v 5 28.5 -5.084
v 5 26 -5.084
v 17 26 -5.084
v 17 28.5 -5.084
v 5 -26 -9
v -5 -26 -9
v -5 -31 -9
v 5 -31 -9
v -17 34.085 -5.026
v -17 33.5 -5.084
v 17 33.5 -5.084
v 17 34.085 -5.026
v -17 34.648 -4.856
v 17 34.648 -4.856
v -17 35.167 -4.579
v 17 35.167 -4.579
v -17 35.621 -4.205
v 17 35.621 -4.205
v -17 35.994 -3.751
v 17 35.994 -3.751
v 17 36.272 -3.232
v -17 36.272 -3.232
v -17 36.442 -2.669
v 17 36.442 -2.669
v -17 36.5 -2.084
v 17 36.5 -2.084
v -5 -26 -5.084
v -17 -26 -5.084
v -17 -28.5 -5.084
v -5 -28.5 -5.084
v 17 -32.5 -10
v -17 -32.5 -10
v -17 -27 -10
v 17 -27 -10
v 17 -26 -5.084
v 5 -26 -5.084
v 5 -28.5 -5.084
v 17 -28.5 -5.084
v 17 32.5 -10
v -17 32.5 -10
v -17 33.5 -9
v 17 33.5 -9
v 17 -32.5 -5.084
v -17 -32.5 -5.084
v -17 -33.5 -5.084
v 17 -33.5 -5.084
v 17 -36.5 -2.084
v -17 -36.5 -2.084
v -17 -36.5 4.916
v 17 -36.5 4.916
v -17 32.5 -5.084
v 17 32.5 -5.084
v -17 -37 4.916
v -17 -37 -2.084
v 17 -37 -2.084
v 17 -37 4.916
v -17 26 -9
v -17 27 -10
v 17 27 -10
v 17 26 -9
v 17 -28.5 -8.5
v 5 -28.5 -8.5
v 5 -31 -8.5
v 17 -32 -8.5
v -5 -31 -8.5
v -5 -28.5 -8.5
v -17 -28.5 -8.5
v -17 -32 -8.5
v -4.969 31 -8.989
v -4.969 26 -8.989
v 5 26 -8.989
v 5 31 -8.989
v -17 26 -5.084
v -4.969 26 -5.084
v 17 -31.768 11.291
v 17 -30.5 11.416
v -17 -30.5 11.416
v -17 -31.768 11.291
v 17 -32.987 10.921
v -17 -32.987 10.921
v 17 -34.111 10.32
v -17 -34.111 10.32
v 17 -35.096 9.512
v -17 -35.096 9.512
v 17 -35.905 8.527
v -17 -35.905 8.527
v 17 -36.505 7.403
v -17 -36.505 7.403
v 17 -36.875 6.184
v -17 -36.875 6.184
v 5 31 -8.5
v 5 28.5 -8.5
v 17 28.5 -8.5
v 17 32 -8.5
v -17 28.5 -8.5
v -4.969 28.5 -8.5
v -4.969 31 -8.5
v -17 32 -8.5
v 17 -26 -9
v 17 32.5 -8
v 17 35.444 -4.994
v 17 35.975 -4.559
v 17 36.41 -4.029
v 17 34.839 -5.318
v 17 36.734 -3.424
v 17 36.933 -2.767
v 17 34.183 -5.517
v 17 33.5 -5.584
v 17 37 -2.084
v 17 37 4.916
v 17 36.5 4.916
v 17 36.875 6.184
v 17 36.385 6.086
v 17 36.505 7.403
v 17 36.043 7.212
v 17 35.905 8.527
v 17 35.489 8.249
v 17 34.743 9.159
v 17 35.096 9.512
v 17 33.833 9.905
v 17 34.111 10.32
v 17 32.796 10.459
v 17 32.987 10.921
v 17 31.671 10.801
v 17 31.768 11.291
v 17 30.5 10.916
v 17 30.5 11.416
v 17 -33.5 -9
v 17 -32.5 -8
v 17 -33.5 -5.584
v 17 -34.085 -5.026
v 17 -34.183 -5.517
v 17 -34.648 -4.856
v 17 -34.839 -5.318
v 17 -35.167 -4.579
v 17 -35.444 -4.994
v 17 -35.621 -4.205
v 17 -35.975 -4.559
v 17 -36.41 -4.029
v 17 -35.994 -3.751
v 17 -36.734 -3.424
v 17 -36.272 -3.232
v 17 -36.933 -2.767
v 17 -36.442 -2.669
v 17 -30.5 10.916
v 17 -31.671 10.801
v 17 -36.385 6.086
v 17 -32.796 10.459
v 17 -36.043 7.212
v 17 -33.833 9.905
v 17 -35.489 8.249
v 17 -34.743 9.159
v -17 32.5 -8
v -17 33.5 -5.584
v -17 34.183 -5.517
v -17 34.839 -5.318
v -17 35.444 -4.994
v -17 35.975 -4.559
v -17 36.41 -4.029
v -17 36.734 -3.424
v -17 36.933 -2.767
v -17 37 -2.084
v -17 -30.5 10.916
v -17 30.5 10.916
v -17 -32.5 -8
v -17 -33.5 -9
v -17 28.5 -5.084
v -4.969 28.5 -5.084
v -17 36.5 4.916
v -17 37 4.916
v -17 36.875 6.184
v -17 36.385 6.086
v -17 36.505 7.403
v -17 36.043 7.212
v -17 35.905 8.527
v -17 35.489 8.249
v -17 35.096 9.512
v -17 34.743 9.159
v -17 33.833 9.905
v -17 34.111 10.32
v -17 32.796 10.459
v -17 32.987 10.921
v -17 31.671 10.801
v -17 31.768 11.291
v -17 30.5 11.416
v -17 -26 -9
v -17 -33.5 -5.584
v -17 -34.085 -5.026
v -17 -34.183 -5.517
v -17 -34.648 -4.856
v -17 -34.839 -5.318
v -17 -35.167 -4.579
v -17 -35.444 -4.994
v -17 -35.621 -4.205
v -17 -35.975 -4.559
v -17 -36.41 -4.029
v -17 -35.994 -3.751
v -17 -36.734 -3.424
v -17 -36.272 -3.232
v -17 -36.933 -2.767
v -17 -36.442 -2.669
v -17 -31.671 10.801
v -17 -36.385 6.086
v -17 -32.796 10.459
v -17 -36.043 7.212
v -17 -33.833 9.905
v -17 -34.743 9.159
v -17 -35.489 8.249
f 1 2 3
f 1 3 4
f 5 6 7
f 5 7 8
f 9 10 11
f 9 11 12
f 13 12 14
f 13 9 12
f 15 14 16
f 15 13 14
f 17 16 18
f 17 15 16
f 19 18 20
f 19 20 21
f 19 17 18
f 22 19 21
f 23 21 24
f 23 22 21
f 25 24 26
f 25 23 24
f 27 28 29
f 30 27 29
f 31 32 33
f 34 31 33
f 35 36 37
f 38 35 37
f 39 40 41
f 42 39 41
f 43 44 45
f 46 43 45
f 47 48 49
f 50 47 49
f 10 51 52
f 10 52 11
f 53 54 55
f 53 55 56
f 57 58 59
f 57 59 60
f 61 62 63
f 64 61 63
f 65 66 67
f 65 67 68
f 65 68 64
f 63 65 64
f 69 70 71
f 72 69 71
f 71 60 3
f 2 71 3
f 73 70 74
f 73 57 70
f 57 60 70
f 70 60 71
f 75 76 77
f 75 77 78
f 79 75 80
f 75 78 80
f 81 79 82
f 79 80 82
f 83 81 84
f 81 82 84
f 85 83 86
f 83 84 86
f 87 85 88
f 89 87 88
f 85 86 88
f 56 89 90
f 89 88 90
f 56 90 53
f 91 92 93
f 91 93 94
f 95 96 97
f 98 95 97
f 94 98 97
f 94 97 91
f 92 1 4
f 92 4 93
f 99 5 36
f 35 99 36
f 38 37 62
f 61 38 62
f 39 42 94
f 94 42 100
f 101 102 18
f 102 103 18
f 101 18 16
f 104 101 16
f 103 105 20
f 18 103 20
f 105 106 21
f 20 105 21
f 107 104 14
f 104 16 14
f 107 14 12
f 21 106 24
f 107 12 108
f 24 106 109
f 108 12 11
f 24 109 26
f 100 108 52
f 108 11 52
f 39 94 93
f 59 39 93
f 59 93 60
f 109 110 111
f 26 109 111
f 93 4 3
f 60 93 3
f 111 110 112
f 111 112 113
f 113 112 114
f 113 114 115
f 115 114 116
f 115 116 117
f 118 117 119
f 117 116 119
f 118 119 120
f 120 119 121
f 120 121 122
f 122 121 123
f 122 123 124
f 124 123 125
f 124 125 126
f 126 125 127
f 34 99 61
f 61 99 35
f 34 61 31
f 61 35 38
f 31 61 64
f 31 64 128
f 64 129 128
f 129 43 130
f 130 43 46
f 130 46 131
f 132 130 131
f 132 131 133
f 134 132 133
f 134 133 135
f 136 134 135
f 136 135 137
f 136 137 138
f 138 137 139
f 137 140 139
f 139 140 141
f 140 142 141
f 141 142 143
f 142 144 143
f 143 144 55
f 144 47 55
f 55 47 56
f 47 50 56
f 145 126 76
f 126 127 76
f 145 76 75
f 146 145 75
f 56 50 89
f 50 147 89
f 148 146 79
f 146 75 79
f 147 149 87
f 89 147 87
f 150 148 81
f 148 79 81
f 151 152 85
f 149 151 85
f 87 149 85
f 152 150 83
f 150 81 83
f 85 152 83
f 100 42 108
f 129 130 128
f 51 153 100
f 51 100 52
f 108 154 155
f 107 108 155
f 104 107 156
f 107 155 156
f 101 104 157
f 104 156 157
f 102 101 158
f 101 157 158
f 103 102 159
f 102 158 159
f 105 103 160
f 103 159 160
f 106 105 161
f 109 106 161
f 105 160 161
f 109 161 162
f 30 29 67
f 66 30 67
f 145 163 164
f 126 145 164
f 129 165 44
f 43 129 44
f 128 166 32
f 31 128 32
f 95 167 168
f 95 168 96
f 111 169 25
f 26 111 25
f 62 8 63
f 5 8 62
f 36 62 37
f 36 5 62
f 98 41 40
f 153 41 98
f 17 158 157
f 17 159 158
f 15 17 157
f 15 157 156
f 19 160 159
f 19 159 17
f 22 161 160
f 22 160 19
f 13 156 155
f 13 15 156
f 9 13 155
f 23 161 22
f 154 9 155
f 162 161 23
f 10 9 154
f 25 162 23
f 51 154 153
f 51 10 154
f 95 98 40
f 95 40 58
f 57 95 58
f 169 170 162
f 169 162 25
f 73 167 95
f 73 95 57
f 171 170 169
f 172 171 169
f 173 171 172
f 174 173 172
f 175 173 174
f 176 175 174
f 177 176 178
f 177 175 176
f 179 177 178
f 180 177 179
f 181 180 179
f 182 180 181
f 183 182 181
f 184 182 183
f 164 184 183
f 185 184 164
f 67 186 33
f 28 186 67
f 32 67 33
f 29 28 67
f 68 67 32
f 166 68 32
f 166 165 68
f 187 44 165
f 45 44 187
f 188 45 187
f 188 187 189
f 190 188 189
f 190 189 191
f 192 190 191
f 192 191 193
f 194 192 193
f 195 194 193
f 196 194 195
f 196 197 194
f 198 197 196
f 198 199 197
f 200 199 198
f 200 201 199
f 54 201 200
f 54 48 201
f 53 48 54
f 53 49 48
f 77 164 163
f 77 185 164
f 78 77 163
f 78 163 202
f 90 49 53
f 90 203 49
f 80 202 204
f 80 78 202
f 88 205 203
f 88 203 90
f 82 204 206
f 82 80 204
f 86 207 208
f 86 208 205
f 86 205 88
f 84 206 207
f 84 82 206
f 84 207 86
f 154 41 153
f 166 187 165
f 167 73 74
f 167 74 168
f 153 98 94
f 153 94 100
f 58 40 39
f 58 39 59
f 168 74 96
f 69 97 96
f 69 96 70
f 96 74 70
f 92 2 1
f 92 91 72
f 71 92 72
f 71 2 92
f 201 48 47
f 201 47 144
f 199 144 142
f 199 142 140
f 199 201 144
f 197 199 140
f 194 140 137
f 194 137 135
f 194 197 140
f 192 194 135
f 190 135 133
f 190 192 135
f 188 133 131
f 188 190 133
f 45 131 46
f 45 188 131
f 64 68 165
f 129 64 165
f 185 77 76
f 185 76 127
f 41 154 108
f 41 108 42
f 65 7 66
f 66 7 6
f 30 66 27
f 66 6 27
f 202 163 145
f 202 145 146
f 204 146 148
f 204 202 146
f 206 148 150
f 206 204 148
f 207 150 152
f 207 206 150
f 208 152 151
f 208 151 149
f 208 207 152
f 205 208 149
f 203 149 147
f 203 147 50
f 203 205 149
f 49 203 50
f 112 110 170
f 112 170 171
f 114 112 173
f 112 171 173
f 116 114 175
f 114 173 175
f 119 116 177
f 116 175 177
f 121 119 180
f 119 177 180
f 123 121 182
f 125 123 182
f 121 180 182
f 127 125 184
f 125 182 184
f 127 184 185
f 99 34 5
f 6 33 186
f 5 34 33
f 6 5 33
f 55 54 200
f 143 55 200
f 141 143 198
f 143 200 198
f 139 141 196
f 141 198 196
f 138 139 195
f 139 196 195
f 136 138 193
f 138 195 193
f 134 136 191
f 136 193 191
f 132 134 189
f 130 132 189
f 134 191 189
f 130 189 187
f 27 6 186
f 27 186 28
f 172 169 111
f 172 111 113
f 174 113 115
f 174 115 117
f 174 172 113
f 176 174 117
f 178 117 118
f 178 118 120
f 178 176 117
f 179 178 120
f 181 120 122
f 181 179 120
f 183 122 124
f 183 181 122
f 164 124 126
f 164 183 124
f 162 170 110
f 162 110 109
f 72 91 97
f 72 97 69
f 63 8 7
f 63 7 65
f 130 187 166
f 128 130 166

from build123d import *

# Parameters (mm, degrees)
PAD022_DEPTH    = 34
SKETCH057_W     = 3.9158892559
SKETCH057_H     = 10
POCKET030_DEPTH = 5
SKETCH058_W     = 3.9050672559
SKETCH058_H     = 9.969185
POCKET031_DEPTH = 5


with BuildPart() as part:
    # Sketch056 → Pad022 (new body)
    with BuildSketch(Plane.YZ):
        with BuildLine():
            Line((-30.5, 22.4158892559), (30.5, 22.4158892559))
            ThreePointArc((37, 15.9158892559), (35.0961940777, 20.5120833336), (30.5, 22.4158892559))
            Line((37, 15.9158892559), (37, 8.9158892559))
            ThreePointArc((33.5, 5.4158892559), (35.9748737342, 6.4410155217), (37, 8.9158892559))
            Line((33.5, 5.4158892559), (33.5, 2))
            Line((32.5, 1), (33.5, 2))
            Line((32.5, 1), (27, 1))
            Line((27, 1), (26, 2))
            Line((26, 2), (26, 5.9158892559))
            Line((26, 5.9158892559), (28.5, 5.9158892559))
            Line((28.5, 5.9158892559), (28.5, 2.5))
            Line((28.5, 2.5), (32, 2.5))
            Line((32, 2.5), (32.5, 3))
            Line((32.5, 3), (32.5, 5.9158892559))
            Line((32.5, 5.9158892559), (33.5, 5.9158892559))
            ThreePointArc((33.5, 5.9158892559), (35.6213203436, 6.7945689123), (36.5, 8.9158892559))
            Line((36.5, 15.9158892559), (36.5, 8.9158892559))
            ThreePointArc((36.5, 15.9158892559), (34.7426406871, 20.158529943), (30.5, 21.9158892559))
            Line((-30.5, 21.9158892559), (30.5, 21.9158892559))
            ThreePointArc((-30.5, 21.9158892559), (-34.7426406871, 20.158529943), (-36.5, 15.9158892559))
            Line((-36.5, 8.9158892559), (-36.5, 15.9158892559))
            ThreePointArc((-36.5, 8.9158892559), (-35.6213203436, 6.7945689123), (-33.5, 5.9158892559))
            Line((-32.5, 5.9158892559), (-33.5, 5.9158892559))
            Line((-32.5, 3), (-32.5, 5.9158892559))
            Line((-32, 2.5), (-32.5, 3))
            Line((-28.5, 2.5), (-32, 2.5))
            Line((-28.5, 5.9158892559), (-28.5, 2.5))
            Line((-26, 5.9158892559), (-28.5, 5.9158892559))
            Line((-26, 2), (-26, 5.9158892559))
            Line((-27, 1), (-26, 2))
            Line((-32.5, 1), (-27, 1))
            Line((-33.5, 2), (-32.5, 1))
            Line((-33.5, 5.4158892559), (-33.5, 2))
            ThreePointArc((-37, 8.9158892559), (-35.9748737342, 6.4410155217), (-33.5, 5.4158892559))
            Line((-37, 8.9158892559), (-37, 15.9158892559))
            ThreePointArc((-30.5, 22.4158892559), (-35.0961940777, 20.5120833336), (-37, 15.9158892559))
        make_face()
    extrude(amount=PAD022_DEPTH)

    # Sketch057 (on Face31 of Pad022) → Pocket030 (cut)
    with BuildSketch(Plane.ZX.offset(-26)):
        with Locations((3.9579446279, 17)):
            Rectangle(SKETCH057_W, SKETCH057_H)
    extrude(amount=-POCKET030_DEPTH, mode=Mode.SUBTRACT)

    # Sketch058 (on Face15 of Pocket030) → Pocket031 (cut)
    with BuildSketch(Plane(origin=(0, 26, 0), x_dir=(0, 0, -1), z_dir=(0, -1, 0))):
        with Locations((-3.9633556279, 17.0154075)):
            Rectangle(SKETCH058_W, SKETCH058_H)
    extrude(amount=-POCKET031_DEPTH, mode=Mode.SUBTRACT)


with BuildPart() as part_1:
    # Body007 placement: moved
    add(part.part.moved(Location((-17, 0, -11))))


solid = part_1.part
